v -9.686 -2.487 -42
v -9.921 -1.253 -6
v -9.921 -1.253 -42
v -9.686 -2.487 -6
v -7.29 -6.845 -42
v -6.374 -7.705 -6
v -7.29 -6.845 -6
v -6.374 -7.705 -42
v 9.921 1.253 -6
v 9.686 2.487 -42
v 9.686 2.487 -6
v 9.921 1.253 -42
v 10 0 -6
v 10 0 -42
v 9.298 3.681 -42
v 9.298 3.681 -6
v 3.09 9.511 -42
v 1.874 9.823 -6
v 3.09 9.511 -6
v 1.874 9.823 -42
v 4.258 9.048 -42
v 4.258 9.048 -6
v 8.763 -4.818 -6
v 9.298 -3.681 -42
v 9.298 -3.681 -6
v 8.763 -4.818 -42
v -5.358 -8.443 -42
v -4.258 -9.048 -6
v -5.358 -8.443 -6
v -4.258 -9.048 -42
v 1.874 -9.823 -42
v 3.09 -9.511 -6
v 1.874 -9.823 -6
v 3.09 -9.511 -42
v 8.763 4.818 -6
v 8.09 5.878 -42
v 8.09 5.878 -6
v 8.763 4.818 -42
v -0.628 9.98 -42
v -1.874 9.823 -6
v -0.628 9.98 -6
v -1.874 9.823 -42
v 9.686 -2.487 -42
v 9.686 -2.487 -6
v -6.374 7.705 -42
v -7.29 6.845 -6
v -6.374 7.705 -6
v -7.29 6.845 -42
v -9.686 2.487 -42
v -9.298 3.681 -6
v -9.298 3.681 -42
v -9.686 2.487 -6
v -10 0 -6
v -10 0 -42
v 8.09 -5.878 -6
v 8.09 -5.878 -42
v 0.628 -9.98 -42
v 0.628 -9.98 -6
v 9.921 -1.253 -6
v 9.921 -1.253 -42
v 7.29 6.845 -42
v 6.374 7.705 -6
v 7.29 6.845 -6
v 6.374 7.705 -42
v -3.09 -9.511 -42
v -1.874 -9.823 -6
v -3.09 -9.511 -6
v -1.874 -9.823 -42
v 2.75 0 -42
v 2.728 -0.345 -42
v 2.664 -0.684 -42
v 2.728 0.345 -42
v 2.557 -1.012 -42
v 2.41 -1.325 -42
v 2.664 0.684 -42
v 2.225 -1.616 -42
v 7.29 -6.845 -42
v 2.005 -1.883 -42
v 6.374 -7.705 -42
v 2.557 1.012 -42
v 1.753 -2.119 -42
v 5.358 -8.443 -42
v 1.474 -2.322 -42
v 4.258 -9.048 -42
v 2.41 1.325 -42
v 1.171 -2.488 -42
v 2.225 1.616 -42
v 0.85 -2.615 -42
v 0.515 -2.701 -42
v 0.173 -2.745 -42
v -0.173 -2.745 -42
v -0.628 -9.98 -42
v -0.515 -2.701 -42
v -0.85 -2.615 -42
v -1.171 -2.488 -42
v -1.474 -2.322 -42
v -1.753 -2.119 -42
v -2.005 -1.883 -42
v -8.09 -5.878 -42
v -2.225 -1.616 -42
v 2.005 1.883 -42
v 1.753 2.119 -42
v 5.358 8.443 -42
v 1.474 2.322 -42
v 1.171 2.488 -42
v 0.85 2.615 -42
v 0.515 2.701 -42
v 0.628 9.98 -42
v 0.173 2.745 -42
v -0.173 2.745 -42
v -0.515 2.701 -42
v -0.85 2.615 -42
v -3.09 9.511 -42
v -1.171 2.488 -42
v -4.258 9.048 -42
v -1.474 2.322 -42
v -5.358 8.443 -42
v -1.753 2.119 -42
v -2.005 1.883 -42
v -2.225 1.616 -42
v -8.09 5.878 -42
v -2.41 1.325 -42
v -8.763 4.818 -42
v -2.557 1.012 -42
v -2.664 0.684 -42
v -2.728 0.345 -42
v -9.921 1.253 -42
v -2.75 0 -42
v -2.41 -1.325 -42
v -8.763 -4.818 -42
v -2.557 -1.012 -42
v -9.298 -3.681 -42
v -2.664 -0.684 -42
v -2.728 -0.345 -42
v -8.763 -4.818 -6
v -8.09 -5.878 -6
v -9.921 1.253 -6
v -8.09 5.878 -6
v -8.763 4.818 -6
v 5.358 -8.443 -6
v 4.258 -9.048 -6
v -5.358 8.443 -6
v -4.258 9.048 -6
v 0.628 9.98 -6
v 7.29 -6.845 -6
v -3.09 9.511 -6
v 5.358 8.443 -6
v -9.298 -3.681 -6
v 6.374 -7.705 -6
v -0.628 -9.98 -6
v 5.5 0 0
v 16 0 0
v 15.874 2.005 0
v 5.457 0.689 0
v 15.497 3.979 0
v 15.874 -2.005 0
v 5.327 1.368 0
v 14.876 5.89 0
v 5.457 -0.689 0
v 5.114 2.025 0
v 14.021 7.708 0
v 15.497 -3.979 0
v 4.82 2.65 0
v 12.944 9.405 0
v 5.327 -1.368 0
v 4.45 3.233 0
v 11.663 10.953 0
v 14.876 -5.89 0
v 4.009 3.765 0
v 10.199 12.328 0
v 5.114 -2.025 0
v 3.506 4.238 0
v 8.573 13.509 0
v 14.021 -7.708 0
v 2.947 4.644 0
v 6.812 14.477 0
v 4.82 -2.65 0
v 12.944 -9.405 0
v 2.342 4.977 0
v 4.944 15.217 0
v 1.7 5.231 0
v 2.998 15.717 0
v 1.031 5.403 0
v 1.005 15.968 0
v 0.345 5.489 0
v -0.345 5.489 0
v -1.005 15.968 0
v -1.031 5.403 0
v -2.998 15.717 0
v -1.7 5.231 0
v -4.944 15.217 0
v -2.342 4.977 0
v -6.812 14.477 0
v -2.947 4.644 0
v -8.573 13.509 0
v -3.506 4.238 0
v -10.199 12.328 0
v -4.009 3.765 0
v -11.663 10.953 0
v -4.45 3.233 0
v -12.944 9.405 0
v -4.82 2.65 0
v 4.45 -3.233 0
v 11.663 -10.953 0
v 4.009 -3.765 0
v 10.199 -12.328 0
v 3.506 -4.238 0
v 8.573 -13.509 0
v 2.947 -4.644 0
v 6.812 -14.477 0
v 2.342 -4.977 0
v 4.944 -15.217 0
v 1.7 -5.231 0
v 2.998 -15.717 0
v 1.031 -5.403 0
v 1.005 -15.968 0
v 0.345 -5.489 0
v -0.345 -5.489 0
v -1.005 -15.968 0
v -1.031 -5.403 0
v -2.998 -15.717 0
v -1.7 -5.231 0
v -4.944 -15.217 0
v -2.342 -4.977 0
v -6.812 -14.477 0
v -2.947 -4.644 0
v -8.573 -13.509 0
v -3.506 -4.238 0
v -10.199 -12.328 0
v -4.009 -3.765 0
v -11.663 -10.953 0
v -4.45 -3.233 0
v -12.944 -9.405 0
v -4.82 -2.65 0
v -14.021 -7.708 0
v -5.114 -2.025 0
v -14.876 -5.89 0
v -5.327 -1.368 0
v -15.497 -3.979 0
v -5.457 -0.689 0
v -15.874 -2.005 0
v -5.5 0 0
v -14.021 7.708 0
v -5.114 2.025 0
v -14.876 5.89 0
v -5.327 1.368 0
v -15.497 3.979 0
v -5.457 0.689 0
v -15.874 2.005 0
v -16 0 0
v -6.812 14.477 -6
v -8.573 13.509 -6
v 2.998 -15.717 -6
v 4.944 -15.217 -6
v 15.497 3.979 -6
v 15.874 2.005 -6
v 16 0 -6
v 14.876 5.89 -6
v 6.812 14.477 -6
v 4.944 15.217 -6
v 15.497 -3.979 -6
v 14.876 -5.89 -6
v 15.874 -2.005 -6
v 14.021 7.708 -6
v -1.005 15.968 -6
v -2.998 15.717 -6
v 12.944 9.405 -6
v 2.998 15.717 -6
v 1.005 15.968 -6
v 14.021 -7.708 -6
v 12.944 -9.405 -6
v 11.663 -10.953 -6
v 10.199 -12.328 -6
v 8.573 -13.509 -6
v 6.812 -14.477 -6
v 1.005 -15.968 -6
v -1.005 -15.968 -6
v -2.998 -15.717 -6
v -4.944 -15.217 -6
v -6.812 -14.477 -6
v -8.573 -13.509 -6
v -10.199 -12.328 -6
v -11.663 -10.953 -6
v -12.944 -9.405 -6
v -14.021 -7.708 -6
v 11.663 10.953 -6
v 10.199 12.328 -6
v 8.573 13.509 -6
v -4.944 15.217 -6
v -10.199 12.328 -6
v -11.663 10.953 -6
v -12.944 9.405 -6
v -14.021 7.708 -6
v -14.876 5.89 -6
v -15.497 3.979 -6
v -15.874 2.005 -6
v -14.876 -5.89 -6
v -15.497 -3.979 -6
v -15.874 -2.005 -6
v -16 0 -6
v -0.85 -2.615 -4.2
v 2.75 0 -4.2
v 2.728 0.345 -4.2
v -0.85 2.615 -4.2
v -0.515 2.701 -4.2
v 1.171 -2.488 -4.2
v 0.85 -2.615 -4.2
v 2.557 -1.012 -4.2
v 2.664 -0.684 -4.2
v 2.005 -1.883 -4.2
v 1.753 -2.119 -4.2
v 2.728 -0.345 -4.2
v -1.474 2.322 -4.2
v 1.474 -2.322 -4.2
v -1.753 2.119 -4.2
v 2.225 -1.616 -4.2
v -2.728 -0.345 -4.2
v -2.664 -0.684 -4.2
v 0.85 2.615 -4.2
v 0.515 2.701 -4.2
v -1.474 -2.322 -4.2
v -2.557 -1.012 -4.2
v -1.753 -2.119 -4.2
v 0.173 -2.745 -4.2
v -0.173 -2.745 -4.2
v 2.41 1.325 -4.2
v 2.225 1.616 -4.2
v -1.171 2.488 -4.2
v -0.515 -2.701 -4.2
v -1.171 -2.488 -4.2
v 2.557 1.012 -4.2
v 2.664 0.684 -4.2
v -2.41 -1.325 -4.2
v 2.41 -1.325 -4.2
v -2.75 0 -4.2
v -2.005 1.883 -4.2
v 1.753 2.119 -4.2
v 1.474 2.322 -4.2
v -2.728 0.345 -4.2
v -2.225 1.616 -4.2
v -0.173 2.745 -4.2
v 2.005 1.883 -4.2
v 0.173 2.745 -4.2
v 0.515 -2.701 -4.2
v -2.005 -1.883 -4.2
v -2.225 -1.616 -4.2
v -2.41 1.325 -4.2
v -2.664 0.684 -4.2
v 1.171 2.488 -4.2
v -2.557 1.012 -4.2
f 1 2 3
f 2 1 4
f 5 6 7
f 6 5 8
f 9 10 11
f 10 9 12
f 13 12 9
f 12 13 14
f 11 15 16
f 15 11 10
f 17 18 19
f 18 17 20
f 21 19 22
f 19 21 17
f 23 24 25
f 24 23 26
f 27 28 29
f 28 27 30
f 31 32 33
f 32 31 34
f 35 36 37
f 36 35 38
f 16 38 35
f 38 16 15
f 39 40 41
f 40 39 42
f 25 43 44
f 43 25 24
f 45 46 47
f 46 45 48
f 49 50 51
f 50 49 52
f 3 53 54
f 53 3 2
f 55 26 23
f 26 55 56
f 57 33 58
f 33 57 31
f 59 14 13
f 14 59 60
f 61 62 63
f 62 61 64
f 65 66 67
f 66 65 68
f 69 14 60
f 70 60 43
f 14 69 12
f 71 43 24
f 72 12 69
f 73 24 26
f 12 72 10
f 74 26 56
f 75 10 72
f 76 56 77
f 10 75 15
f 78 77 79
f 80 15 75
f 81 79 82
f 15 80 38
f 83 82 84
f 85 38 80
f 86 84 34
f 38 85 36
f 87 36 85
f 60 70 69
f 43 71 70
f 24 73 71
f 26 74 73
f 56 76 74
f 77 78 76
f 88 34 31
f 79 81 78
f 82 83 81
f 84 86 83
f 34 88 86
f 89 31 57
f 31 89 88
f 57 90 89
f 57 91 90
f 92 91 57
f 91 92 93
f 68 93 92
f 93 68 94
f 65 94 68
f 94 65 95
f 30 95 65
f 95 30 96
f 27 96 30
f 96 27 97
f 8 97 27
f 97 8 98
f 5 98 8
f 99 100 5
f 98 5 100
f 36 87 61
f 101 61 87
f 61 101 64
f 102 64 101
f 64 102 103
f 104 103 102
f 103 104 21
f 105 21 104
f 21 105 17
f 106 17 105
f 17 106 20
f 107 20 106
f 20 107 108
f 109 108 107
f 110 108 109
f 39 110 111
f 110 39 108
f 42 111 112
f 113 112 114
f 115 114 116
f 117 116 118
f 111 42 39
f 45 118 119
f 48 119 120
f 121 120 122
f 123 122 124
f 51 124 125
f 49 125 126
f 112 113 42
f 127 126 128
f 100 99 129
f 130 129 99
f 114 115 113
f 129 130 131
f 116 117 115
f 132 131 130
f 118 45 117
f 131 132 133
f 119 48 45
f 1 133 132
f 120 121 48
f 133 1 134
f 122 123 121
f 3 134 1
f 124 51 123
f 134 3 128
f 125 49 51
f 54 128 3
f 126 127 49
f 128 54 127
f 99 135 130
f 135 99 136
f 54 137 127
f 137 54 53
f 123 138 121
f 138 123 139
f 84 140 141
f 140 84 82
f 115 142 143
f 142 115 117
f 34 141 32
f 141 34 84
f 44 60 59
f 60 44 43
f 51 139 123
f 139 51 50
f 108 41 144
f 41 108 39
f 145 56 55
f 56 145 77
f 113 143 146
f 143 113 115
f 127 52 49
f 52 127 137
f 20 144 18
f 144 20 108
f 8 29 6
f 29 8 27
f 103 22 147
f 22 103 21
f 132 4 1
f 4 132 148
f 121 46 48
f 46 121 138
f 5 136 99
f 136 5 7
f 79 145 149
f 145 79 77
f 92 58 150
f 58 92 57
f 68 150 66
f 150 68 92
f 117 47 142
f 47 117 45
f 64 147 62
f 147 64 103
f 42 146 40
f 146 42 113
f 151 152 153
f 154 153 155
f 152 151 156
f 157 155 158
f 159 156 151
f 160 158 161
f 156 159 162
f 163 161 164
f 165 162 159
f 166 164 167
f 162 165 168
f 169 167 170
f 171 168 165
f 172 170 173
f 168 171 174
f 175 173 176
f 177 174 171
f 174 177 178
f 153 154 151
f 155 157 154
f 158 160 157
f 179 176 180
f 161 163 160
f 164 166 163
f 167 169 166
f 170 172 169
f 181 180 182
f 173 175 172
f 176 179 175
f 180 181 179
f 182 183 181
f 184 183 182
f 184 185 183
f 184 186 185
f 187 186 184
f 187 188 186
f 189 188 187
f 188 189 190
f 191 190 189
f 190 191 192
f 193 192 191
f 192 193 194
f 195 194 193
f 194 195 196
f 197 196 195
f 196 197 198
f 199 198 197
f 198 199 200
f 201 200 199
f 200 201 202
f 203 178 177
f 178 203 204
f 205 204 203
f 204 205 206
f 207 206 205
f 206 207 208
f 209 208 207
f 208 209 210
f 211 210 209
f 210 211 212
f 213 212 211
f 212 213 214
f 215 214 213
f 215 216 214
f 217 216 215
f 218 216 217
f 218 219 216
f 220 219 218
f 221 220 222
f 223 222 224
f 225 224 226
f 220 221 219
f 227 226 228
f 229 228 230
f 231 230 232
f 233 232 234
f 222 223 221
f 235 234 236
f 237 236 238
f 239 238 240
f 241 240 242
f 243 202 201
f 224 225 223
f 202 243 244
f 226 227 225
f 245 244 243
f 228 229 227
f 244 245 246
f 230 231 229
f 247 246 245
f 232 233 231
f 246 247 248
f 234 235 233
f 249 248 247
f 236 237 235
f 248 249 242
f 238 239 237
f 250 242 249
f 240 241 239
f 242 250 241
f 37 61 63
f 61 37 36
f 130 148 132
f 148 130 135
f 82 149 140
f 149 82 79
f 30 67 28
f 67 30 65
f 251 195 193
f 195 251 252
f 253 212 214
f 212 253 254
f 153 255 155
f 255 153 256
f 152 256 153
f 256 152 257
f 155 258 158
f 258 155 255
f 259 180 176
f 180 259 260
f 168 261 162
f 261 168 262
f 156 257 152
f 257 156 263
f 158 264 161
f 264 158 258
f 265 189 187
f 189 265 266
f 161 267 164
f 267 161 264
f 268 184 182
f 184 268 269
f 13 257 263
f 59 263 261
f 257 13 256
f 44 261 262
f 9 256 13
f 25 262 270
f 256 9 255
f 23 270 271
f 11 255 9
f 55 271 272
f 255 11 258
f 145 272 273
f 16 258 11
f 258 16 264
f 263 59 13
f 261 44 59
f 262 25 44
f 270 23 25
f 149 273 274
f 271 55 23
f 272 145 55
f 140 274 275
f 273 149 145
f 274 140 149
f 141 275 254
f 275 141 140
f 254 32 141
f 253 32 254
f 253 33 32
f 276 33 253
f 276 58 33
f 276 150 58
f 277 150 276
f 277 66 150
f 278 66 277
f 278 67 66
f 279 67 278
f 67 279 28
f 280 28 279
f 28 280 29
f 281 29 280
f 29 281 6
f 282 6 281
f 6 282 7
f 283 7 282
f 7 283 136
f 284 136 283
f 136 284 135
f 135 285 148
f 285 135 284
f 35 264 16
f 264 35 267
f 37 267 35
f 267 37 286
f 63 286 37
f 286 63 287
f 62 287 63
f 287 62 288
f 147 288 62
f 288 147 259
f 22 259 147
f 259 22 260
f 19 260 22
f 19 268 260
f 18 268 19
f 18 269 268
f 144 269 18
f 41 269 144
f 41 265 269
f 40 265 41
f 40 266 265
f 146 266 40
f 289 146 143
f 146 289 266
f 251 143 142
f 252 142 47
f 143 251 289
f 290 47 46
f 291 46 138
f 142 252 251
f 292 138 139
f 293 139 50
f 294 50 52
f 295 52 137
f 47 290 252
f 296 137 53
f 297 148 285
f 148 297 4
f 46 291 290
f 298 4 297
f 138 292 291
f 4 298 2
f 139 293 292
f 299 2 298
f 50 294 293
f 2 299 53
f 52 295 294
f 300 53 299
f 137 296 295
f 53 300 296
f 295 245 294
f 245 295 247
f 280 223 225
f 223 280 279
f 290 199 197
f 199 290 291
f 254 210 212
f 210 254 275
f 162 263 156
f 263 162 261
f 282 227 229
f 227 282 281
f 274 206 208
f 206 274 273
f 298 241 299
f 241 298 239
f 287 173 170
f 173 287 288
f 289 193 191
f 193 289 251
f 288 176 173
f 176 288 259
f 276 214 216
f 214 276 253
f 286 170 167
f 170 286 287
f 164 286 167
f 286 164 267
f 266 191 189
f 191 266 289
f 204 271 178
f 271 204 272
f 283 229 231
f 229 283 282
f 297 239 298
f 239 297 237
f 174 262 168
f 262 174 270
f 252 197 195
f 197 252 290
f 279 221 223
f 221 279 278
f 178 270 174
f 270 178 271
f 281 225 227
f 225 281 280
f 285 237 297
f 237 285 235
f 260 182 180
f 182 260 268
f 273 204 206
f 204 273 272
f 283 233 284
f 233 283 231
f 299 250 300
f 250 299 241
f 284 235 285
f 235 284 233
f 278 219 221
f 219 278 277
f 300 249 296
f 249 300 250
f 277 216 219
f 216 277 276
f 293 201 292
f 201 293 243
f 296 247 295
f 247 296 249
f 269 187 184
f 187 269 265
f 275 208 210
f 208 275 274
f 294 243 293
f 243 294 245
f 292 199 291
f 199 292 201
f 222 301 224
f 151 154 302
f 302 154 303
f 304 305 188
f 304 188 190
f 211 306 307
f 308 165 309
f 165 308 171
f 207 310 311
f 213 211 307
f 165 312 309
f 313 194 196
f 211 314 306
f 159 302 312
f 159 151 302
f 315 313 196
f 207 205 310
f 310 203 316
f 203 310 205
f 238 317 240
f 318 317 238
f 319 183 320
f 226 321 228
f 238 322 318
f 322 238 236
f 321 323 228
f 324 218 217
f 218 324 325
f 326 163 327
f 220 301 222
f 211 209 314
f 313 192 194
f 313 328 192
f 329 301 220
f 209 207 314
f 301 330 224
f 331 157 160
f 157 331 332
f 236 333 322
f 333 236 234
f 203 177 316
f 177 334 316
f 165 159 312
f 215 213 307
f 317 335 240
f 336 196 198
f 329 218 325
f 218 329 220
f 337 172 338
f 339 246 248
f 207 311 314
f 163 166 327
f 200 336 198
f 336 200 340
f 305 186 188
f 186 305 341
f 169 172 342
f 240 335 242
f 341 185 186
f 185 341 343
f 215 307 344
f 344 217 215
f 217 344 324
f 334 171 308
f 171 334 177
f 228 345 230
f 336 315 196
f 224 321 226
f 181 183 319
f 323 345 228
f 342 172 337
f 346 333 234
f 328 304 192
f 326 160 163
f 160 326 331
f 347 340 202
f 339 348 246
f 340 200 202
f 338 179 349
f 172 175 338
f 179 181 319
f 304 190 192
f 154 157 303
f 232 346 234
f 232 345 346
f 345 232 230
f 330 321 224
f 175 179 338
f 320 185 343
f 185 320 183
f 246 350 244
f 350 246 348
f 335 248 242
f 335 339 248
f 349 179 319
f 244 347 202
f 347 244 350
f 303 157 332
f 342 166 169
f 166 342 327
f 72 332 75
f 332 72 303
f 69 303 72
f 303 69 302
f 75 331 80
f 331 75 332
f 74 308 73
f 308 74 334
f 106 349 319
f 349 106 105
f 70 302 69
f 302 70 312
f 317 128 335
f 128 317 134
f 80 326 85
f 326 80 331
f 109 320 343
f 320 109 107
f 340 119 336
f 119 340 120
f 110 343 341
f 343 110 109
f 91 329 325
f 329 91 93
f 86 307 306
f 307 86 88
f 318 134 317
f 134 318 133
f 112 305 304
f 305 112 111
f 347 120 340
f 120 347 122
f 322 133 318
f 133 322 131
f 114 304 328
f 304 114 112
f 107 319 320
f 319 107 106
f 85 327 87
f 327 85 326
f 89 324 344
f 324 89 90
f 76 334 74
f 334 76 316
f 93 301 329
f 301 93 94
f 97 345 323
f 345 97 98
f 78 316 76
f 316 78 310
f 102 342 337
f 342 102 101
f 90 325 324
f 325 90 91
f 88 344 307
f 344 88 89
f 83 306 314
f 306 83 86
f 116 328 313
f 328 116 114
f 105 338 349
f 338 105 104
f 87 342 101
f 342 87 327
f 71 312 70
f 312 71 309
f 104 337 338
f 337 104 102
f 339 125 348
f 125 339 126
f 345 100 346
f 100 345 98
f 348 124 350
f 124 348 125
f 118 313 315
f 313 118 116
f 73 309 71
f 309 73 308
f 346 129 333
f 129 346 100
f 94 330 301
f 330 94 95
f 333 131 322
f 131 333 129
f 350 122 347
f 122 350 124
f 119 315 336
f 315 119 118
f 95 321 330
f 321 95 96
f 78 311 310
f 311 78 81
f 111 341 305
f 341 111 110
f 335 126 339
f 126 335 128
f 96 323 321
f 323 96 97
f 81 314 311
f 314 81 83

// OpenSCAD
$fn = 50;


difference() {
	union() {
		translate(v = [0, 0, -42.0000000000]) {
			cylinder(h = 42, r = 10.0000000000);
		}
		translate(v = [0, 0, -6.0000000000]) {
			cylinder(h = 6, r = 16.0000000000);
		}
	}
	union() {
		translate(v = [0, 0, 0]) {
			rotate(a = [0, 0, 0]) {
				difference() {
					union() {
						#translate(v = [0, 0, -42.0000000000]) {
							cylinder(h = 42, r = 2.2500000000);
						}
						#translate(v = [0, 0, -4.2000000000]) {
							cylinder(h = 4.2000000000, r1 = 2.7500000000, r2 = 5.5000000000);
						}
						#translate(v = [0, 0, -42.0000000000]) {
							cylinder(h = 42, r = 2.7500000000);
						}
						#translate(v = [0, 0, -42.0000000000]) {
							cylinder(h = 42, r = 2.2500000000);
						}
					}
					union();
				}
			}
		}
	}
}
